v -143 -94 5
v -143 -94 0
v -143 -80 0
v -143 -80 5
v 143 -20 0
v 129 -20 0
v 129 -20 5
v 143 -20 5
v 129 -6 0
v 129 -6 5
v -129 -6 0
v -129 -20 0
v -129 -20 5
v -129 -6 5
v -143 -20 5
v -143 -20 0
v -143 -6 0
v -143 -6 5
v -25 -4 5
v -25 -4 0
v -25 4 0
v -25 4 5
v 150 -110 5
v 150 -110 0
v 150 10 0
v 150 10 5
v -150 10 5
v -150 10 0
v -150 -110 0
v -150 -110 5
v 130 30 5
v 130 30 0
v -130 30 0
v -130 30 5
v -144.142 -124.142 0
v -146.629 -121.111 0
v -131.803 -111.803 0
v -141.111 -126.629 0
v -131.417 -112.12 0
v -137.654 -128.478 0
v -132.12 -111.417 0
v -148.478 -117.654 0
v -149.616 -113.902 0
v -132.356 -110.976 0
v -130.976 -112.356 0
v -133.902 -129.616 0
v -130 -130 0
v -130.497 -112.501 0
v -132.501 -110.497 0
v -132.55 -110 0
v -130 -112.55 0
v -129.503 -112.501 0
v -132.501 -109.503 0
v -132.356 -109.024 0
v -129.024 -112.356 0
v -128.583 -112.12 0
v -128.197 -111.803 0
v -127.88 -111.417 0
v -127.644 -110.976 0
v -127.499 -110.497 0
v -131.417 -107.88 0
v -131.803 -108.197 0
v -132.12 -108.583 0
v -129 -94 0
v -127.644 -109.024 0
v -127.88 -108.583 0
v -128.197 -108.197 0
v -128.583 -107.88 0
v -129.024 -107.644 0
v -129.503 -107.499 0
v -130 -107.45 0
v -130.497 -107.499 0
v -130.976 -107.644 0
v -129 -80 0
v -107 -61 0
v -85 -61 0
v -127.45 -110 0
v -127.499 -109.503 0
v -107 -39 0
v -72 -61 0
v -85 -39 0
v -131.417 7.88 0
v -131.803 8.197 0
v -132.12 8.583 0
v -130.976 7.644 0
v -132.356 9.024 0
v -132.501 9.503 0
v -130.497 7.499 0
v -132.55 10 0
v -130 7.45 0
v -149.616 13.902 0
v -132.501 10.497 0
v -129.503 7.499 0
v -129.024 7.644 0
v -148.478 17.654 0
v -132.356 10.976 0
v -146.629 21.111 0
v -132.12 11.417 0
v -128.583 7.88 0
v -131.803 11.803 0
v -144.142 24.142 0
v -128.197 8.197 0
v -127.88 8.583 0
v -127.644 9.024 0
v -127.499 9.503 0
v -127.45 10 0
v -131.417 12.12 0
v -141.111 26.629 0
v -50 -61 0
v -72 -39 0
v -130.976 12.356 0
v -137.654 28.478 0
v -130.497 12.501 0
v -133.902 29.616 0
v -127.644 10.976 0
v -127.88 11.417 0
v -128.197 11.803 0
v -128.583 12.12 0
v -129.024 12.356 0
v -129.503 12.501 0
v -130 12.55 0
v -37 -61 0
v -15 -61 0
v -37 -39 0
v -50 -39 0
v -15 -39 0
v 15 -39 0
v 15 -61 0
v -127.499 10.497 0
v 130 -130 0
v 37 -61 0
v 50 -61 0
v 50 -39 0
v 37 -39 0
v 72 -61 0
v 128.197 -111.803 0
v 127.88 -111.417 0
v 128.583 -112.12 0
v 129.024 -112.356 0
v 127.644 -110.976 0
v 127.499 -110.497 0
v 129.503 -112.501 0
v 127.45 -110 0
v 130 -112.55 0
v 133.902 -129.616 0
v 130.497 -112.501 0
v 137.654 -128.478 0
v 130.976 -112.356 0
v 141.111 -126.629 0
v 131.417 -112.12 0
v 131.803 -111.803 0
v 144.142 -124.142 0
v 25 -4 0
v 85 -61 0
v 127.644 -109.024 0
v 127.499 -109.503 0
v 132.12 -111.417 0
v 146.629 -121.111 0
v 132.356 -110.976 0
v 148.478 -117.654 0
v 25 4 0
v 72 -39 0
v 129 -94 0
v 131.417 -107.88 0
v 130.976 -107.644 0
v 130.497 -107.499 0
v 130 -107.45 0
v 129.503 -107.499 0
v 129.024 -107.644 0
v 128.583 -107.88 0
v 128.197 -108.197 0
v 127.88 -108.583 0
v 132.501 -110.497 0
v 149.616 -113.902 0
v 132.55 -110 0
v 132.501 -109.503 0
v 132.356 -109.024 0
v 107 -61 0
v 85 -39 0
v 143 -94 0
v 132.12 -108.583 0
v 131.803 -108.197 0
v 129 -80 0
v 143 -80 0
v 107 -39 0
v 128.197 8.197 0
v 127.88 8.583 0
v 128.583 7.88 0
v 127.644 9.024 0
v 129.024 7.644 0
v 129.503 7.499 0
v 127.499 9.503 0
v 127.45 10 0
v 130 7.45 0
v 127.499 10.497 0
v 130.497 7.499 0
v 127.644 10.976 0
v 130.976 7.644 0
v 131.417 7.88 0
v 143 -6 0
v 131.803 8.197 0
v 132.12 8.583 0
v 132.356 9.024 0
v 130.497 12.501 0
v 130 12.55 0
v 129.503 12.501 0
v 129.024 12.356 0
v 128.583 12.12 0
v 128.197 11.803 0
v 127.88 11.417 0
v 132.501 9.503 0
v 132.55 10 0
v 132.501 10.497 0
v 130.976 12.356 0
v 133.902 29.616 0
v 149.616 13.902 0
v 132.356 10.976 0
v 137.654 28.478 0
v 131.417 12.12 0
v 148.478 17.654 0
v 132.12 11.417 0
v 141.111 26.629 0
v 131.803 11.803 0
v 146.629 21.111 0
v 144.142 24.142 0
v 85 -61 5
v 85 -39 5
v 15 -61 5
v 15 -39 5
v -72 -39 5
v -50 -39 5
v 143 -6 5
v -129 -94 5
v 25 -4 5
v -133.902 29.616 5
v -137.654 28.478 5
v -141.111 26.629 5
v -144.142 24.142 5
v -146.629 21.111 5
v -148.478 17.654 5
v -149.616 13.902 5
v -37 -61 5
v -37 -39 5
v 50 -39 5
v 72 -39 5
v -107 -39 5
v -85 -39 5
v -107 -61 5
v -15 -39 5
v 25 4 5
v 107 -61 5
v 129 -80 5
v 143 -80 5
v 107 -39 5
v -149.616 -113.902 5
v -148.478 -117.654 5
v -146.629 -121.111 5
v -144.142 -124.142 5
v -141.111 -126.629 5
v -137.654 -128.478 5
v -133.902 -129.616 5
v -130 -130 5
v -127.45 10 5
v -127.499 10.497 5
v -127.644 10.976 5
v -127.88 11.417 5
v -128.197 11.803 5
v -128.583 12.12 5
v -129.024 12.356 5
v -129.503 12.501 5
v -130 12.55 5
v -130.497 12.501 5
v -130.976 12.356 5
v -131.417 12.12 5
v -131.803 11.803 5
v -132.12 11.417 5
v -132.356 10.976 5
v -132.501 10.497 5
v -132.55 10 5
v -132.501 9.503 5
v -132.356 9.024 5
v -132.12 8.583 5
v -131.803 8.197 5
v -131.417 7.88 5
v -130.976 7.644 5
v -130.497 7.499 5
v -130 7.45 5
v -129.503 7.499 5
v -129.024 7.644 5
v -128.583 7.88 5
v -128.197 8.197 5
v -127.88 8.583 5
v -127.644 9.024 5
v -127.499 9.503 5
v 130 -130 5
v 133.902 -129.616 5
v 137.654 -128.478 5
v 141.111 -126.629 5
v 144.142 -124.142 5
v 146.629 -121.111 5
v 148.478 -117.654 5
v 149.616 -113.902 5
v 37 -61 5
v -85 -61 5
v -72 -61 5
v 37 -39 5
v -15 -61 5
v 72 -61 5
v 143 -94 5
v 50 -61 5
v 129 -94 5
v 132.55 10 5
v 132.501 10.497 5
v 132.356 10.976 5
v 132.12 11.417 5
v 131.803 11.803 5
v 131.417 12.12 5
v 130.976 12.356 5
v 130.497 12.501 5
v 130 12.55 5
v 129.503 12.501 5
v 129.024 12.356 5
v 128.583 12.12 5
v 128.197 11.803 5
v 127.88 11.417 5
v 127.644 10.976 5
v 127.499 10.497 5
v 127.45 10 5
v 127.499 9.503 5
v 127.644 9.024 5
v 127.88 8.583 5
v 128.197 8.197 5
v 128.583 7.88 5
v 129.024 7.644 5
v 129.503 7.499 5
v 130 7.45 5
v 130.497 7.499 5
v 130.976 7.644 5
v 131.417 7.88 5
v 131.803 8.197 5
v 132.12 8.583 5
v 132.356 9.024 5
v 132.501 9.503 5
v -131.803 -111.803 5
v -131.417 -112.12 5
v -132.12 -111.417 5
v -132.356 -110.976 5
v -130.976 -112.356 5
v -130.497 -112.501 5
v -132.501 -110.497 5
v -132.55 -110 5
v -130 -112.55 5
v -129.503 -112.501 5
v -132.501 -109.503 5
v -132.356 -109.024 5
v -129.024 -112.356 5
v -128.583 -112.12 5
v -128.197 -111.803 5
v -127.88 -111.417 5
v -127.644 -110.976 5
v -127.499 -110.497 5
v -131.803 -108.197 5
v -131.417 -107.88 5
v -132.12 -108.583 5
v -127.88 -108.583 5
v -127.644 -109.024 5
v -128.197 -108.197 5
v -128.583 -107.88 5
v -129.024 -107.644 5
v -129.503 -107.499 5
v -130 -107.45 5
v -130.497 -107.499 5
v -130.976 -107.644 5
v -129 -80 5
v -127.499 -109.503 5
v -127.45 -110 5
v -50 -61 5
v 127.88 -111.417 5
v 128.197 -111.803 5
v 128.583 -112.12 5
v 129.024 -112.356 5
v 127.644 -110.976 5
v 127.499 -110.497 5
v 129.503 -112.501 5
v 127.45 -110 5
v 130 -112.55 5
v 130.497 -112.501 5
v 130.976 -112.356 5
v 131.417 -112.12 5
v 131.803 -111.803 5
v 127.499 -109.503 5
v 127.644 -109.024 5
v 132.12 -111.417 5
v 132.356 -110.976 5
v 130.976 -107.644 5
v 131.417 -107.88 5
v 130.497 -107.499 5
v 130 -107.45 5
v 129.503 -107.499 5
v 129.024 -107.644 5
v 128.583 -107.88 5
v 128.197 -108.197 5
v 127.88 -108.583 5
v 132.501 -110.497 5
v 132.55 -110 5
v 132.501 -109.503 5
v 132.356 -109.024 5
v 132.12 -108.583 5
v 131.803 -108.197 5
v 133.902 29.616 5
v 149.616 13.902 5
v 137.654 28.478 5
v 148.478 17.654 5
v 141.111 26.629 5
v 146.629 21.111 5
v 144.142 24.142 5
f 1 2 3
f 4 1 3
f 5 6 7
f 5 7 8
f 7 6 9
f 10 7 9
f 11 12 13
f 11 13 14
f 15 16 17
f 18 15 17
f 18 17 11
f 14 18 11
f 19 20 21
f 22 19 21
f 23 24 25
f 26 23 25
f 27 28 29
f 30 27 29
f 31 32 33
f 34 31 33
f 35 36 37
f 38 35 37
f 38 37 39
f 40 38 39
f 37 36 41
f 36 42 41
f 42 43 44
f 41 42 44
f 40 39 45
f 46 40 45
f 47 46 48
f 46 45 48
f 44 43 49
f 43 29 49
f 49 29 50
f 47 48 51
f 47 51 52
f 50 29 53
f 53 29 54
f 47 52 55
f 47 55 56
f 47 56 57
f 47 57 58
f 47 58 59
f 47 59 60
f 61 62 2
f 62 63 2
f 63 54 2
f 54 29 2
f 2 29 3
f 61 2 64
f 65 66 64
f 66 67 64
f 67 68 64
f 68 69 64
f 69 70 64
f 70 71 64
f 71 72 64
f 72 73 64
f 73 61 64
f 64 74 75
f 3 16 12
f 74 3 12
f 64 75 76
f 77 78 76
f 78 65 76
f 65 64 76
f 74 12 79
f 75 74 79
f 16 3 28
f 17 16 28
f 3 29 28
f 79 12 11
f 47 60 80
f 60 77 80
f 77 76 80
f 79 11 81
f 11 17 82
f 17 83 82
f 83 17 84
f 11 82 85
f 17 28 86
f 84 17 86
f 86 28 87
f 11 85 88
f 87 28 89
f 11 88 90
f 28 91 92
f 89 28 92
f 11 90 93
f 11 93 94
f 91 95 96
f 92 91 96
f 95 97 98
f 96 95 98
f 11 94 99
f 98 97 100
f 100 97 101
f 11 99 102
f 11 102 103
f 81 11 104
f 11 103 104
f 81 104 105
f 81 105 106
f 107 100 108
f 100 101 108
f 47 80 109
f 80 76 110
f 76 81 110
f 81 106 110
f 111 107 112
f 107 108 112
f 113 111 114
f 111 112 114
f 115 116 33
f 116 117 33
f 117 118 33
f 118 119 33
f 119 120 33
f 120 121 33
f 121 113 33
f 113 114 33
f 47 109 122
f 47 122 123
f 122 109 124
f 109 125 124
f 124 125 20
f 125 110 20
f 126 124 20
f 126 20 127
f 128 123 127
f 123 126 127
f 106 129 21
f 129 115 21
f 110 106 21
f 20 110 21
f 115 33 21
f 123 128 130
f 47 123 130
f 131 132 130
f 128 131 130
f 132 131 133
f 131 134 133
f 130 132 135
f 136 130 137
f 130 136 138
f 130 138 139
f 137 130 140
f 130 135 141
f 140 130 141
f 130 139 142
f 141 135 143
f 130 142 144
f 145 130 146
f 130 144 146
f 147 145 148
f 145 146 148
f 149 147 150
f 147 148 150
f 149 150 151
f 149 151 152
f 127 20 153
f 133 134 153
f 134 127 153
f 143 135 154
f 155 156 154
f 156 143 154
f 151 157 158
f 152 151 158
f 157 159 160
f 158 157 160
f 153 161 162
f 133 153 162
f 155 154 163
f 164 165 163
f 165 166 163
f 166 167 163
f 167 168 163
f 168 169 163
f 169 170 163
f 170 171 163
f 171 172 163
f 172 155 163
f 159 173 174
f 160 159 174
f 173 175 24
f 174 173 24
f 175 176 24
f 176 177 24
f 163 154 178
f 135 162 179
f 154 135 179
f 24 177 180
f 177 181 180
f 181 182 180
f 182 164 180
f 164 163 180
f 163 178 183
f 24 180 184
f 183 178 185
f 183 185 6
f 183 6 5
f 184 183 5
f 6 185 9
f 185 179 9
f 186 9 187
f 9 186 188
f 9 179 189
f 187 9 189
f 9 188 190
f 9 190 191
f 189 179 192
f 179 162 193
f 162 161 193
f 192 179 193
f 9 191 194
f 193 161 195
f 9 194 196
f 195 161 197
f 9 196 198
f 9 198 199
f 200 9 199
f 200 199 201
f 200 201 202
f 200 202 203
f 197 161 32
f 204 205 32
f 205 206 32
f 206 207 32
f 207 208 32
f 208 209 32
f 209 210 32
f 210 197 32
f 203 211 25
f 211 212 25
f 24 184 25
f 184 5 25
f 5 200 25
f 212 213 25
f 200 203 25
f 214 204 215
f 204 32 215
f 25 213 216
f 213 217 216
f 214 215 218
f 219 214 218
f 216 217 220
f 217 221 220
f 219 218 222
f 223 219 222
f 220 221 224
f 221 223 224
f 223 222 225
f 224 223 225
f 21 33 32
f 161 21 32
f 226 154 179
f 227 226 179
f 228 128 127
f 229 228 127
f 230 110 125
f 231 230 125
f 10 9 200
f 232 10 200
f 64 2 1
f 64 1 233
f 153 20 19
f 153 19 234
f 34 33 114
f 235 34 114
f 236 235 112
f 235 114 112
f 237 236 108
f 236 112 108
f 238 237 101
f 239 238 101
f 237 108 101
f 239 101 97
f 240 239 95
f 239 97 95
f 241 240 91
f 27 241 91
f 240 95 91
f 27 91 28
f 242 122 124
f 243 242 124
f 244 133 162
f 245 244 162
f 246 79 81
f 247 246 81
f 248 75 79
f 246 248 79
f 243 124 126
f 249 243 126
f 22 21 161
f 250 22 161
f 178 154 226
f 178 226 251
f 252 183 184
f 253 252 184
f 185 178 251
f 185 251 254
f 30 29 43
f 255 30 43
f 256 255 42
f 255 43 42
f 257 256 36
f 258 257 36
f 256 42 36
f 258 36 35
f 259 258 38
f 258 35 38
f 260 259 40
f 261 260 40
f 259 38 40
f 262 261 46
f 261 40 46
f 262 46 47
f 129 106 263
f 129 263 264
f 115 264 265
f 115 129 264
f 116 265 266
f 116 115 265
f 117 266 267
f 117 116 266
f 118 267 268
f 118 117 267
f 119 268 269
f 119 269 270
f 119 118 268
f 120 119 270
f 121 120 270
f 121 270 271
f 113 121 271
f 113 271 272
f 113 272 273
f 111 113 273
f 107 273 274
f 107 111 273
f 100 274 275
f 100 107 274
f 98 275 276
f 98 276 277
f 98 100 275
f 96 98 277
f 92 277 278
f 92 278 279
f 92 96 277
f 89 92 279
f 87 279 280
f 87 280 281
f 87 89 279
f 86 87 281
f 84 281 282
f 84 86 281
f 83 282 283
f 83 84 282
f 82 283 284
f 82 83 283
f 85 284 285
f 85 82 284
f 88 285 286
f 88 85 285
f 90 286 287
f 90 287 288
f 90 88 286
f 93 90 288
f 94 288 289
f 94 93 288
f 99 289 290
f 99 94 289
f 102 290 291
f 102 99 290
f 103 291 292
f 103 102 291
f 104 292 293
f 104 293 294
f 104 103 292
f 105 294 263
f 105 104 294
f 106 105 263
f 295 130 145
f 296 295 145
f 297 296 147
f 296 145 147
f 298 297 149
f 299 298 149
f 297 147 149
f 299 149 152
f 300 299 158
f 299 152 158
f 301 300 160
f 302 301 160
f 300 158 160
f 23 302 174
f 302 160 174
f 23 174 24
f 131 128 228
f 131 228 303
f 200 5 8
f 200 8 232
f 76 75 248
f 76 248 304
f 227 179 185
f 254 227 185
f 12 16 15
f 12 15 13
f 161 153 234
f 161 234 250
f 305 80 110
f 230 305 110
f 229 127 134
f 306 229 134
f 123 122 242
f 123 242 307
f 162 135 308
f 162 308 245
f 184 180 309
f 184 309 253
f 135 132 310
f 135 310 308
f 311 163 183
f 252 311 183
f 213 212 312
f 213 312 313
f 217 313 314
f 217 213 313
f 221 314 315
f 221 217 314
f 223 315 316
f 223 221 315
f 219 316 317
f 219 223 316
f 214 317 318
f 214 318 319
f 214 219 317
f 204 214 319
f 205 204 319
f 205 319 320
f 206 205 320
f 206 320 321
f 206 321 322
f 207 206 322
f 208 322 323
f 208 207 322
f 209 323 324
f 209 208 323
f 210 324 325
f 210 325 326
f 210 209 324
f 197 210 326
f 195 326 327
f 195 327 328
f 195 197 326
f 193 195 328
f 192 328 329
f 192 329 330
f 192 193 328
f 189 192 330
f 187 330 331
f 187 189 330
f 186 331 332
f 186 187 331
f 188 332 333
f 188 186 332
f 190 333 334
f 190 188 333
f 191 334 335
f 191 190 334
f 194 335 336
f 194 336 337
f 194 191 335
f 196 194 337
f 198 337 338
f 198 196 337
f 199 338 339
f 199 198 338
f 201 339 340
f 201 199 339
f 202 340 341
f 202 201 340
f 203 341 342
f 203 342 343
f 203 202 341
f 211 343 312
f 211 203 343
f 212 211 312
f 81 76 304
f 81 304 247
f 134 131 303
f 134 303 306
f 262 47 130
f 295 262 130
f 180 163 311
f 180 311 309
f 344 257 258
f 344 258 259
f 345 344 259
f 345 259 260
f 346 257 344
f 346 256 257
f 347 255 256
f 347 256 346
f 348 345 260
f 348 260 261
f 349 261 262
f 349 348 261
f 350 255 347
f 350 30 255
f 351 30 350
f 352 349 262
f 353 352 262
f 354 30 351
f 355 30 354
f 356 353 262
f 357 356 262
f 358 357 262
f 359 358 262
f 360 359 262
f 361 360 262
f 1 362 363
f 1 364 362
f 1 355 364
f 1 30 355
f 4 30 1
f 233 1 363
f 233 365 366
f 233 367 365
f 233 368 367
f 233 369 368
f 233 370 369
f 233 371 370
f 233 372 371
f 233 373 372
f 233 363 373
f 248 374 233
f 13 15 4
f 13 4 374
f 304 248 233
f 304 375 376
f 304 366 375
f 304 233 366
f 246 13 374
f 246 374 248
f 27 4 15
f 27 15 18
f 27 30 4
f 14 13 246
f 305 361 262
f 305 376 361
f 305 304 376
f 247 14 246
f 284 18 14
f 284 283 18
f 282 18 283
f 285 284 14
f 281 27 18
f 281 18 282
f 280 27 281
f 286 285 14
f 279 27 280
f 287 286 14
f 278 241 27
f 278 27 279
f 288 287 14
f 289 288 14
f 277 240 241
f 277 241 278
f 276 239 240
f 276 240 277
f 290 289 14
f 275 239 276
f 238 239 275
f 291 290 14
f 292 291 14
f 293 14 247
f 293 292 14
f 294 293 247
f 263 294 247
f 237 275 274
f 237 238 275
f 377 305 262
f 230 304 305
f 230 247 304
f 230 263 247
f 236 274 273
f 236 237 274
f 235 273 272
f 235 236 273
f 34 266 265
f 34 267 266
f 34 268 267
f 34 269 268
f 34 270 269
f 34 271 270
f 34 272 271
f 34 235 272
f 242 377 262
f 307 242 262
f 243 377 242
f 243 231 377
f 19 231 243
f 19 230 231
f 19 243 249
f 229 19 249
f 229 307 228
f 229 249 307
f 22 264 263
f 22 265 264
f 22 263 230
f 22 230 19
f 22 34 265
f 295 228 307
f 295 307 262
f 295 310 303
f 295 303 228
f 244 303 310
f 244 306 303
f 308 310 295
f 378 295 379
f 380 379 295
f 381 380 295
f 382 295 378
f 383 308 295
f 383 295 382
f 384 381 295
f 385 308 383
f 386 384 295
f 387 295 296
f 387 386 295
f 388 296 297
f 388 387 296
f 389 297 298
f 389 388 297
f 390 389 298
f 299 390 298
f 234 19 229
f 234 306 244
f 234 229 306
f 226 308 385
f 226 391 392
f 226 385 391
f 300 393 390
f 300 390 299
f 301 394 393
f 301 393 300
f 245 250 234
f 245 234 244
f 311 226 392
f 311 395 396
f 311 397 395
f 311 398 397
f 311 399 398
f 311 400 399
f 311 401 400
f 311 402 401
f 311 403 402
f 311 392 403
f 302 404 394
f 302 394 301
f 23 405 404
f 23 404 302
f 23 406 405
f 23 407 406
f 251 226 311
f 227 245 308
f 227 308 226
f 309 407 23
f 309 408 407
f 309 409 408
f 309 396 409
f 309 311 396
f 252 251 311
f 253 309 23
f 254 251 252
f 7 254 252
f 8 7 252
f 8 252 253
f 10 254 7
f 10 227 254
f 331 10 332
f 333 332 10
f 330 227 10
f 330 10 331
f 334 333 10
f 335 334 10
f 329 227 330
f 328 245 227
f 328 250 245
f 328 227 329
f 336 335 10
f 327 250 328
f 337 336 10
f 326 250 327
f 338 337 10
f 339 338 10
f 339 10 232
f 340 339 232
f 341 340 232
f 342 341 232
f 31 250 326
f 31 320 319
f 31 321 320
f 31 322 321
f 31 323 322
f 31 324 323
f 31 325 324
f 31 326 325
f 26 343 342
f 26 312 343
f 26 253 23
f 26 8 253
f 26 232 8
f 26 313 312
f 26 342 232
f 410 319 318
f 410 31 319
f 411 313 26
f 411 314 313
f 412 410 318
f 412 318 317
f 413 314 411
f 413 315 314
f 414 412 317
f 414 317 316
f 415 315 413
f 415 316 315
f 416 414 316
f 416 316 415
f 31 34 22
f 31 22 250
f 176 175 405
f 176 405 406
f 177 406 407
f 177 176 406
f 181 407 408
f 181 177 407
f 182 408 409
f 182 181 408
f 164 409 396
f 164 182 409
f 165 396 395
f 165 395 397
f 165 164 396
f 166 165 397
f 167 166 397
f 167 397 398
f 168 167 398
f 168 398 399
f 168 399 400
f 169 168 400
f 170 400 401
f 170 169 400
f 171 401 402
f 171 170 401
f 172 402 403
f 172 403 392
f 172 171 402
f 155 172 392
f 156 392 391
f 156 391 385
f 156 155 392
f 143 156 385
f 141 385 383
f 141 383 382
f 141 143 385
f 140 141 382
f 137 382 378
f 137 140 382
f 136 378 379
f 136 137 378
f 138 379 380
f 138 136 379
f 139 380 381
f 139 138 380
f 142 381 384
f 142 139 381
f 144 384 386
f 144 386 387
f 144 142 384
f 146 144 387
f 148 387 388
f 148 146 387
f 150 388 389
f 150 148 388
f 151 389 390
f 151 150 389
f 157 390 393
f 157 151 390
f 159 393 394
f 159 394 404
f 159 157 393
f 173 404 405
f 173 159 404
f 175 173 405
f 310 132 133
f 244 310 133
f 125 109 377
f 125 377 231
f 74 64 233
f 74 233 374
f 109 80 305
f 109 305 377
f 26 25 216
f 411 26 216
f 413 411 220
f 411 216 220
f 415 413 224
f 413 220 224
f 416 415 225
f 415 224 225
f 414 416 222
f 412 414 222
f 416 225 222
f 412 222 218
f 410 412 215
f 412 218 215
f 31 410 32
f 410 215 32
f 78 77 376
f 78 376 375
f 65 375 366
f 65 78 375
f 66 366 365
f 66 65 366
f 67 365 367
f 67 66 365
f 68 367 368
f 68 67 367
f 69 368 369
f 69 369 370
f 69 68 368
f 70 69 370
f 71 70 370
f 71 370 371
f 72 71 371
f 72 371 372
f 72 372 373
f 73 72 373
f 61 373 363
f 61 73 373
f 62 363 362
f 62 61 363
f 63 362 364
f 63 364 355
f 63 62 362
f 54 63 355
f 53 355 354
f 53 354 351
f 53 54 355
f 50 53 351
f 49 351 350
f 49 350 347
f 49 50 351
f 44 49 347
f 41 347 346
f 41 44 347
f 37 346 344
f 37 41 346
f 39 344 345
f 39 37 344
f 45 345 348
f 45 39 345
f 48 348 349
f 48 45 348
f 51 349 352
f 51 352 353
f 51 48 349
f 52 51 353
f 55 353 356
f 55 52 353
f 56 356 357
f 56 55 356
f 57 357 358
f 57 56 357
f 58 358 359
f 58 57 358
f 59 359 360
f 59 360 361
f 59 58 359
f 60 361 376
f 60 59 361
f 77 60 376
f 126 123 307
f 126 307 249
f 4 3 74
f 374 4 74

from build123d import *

# Parameters (mm, degrees)
SKETCH_2_R      = 2.55
SKETCH_2_W      = 22
SKETCH_2_H      = 22
SKETCH_2_W_2    = 14
SKETCH_2_H_2    = 14
SKETCH_2_W_3    = 50
SKETCH_2_H_3    = 8
EXTRUDE_1_DEPTH = 5


with BuildPart() as part:
    # 草图2 → 凸台-拉伸1 (new body)
    with BuildSketch(Plane.XY):
        with BuildLine():
            Line((-130, -130), (130, -130))
            ThreePointArc((130, -130), (144.142135624, -124.142135624), (150, -110))
            Line((150, -110), (150, 10))
            ThreePointArc((150, 10), (144.142135624, 24.142135624), (130, 30))
            Line((130, 30), (-130, 30))
            ThreePointArc((-130, 30), (-144.142135624, 24.142135624), (-150, 10))
            Line((-150, 10), (-150, -110))
            ThreePointArc((-150, -110), (-144.142135624, -124.142135624), (-130, -130))
        make_face()
        with Locations((130, -110)):
            Circle(SKETCH_2_R, mode=Mode.SUBTRACT)
        with Locations((130, 10)):
            Circle(SKETCH_2_R, mode=Mode.SUBTRACT)
        with Locations((-130, -110)):
            Circle(SKETCH_2_R, mode=Mode.SUBTRACT)
        with Locations((-130, 10)):
            Circle(SKETCH_2_R, mode=Mode.SUBTRACT)
        with Locations((-61, -50)):
            Rectangle(SKETCH_2_W, SKETCH_2_H, mode=Mode.SUBTRACT)
        with Locations((-26, -50)):
            Rectangle(SKETCH_2_W, SKETCH_2_H, mode=Mode.SUBTRACT)
        with Locations((26, -50)):
            Rectangle(SKETCH_2_W, SKETCH_2_H, mode=Mode.SUBTRACT)
        with Locations((136, -87)):
            Rectangle(SKETCH_2_W_2, SKETCH_2_H_2, mode=Mode.SUBTRACT)
        with Locations((136, -13)):
            Rectangle(SKETCH_2_W_2, SKETCH_2_H_2, mode=Mode.SUBTRACT)
        Rectangle(SKETCH_2_W_3, SKETCH_2_H_3, mode=Mode.SUBTRACT)
        with Locations((-136, -87)):
            Rectangle(SKETCH_2_W_2, SKETCH_2_H_2, mode=Mode.SUBTRACT)
        with Locations((-136, -13)):
            Rectangle(SKETCH_2_W_2, SKETCH_2_H_2, mode=Mode.SUBTRACT)
        with Locations((-96, -50)):
            Rectangle(SKETCH_2_W, SKETCH_2_H, mode=Mode.SUBTRACT)
        with Locations((61, -50)):
            Rectangle(SKETCH_2_W, SKETCH_2_H, mode=Mode.SUBTRACT)
        with Locations((96, -50)):
            Rectangle(SKETCH_2_W, SKETCH_2_H, mode=Mode.SUBTRACT)
    extrude(amount=EXTRUDE_1_DEPTH)


solid = part.part
